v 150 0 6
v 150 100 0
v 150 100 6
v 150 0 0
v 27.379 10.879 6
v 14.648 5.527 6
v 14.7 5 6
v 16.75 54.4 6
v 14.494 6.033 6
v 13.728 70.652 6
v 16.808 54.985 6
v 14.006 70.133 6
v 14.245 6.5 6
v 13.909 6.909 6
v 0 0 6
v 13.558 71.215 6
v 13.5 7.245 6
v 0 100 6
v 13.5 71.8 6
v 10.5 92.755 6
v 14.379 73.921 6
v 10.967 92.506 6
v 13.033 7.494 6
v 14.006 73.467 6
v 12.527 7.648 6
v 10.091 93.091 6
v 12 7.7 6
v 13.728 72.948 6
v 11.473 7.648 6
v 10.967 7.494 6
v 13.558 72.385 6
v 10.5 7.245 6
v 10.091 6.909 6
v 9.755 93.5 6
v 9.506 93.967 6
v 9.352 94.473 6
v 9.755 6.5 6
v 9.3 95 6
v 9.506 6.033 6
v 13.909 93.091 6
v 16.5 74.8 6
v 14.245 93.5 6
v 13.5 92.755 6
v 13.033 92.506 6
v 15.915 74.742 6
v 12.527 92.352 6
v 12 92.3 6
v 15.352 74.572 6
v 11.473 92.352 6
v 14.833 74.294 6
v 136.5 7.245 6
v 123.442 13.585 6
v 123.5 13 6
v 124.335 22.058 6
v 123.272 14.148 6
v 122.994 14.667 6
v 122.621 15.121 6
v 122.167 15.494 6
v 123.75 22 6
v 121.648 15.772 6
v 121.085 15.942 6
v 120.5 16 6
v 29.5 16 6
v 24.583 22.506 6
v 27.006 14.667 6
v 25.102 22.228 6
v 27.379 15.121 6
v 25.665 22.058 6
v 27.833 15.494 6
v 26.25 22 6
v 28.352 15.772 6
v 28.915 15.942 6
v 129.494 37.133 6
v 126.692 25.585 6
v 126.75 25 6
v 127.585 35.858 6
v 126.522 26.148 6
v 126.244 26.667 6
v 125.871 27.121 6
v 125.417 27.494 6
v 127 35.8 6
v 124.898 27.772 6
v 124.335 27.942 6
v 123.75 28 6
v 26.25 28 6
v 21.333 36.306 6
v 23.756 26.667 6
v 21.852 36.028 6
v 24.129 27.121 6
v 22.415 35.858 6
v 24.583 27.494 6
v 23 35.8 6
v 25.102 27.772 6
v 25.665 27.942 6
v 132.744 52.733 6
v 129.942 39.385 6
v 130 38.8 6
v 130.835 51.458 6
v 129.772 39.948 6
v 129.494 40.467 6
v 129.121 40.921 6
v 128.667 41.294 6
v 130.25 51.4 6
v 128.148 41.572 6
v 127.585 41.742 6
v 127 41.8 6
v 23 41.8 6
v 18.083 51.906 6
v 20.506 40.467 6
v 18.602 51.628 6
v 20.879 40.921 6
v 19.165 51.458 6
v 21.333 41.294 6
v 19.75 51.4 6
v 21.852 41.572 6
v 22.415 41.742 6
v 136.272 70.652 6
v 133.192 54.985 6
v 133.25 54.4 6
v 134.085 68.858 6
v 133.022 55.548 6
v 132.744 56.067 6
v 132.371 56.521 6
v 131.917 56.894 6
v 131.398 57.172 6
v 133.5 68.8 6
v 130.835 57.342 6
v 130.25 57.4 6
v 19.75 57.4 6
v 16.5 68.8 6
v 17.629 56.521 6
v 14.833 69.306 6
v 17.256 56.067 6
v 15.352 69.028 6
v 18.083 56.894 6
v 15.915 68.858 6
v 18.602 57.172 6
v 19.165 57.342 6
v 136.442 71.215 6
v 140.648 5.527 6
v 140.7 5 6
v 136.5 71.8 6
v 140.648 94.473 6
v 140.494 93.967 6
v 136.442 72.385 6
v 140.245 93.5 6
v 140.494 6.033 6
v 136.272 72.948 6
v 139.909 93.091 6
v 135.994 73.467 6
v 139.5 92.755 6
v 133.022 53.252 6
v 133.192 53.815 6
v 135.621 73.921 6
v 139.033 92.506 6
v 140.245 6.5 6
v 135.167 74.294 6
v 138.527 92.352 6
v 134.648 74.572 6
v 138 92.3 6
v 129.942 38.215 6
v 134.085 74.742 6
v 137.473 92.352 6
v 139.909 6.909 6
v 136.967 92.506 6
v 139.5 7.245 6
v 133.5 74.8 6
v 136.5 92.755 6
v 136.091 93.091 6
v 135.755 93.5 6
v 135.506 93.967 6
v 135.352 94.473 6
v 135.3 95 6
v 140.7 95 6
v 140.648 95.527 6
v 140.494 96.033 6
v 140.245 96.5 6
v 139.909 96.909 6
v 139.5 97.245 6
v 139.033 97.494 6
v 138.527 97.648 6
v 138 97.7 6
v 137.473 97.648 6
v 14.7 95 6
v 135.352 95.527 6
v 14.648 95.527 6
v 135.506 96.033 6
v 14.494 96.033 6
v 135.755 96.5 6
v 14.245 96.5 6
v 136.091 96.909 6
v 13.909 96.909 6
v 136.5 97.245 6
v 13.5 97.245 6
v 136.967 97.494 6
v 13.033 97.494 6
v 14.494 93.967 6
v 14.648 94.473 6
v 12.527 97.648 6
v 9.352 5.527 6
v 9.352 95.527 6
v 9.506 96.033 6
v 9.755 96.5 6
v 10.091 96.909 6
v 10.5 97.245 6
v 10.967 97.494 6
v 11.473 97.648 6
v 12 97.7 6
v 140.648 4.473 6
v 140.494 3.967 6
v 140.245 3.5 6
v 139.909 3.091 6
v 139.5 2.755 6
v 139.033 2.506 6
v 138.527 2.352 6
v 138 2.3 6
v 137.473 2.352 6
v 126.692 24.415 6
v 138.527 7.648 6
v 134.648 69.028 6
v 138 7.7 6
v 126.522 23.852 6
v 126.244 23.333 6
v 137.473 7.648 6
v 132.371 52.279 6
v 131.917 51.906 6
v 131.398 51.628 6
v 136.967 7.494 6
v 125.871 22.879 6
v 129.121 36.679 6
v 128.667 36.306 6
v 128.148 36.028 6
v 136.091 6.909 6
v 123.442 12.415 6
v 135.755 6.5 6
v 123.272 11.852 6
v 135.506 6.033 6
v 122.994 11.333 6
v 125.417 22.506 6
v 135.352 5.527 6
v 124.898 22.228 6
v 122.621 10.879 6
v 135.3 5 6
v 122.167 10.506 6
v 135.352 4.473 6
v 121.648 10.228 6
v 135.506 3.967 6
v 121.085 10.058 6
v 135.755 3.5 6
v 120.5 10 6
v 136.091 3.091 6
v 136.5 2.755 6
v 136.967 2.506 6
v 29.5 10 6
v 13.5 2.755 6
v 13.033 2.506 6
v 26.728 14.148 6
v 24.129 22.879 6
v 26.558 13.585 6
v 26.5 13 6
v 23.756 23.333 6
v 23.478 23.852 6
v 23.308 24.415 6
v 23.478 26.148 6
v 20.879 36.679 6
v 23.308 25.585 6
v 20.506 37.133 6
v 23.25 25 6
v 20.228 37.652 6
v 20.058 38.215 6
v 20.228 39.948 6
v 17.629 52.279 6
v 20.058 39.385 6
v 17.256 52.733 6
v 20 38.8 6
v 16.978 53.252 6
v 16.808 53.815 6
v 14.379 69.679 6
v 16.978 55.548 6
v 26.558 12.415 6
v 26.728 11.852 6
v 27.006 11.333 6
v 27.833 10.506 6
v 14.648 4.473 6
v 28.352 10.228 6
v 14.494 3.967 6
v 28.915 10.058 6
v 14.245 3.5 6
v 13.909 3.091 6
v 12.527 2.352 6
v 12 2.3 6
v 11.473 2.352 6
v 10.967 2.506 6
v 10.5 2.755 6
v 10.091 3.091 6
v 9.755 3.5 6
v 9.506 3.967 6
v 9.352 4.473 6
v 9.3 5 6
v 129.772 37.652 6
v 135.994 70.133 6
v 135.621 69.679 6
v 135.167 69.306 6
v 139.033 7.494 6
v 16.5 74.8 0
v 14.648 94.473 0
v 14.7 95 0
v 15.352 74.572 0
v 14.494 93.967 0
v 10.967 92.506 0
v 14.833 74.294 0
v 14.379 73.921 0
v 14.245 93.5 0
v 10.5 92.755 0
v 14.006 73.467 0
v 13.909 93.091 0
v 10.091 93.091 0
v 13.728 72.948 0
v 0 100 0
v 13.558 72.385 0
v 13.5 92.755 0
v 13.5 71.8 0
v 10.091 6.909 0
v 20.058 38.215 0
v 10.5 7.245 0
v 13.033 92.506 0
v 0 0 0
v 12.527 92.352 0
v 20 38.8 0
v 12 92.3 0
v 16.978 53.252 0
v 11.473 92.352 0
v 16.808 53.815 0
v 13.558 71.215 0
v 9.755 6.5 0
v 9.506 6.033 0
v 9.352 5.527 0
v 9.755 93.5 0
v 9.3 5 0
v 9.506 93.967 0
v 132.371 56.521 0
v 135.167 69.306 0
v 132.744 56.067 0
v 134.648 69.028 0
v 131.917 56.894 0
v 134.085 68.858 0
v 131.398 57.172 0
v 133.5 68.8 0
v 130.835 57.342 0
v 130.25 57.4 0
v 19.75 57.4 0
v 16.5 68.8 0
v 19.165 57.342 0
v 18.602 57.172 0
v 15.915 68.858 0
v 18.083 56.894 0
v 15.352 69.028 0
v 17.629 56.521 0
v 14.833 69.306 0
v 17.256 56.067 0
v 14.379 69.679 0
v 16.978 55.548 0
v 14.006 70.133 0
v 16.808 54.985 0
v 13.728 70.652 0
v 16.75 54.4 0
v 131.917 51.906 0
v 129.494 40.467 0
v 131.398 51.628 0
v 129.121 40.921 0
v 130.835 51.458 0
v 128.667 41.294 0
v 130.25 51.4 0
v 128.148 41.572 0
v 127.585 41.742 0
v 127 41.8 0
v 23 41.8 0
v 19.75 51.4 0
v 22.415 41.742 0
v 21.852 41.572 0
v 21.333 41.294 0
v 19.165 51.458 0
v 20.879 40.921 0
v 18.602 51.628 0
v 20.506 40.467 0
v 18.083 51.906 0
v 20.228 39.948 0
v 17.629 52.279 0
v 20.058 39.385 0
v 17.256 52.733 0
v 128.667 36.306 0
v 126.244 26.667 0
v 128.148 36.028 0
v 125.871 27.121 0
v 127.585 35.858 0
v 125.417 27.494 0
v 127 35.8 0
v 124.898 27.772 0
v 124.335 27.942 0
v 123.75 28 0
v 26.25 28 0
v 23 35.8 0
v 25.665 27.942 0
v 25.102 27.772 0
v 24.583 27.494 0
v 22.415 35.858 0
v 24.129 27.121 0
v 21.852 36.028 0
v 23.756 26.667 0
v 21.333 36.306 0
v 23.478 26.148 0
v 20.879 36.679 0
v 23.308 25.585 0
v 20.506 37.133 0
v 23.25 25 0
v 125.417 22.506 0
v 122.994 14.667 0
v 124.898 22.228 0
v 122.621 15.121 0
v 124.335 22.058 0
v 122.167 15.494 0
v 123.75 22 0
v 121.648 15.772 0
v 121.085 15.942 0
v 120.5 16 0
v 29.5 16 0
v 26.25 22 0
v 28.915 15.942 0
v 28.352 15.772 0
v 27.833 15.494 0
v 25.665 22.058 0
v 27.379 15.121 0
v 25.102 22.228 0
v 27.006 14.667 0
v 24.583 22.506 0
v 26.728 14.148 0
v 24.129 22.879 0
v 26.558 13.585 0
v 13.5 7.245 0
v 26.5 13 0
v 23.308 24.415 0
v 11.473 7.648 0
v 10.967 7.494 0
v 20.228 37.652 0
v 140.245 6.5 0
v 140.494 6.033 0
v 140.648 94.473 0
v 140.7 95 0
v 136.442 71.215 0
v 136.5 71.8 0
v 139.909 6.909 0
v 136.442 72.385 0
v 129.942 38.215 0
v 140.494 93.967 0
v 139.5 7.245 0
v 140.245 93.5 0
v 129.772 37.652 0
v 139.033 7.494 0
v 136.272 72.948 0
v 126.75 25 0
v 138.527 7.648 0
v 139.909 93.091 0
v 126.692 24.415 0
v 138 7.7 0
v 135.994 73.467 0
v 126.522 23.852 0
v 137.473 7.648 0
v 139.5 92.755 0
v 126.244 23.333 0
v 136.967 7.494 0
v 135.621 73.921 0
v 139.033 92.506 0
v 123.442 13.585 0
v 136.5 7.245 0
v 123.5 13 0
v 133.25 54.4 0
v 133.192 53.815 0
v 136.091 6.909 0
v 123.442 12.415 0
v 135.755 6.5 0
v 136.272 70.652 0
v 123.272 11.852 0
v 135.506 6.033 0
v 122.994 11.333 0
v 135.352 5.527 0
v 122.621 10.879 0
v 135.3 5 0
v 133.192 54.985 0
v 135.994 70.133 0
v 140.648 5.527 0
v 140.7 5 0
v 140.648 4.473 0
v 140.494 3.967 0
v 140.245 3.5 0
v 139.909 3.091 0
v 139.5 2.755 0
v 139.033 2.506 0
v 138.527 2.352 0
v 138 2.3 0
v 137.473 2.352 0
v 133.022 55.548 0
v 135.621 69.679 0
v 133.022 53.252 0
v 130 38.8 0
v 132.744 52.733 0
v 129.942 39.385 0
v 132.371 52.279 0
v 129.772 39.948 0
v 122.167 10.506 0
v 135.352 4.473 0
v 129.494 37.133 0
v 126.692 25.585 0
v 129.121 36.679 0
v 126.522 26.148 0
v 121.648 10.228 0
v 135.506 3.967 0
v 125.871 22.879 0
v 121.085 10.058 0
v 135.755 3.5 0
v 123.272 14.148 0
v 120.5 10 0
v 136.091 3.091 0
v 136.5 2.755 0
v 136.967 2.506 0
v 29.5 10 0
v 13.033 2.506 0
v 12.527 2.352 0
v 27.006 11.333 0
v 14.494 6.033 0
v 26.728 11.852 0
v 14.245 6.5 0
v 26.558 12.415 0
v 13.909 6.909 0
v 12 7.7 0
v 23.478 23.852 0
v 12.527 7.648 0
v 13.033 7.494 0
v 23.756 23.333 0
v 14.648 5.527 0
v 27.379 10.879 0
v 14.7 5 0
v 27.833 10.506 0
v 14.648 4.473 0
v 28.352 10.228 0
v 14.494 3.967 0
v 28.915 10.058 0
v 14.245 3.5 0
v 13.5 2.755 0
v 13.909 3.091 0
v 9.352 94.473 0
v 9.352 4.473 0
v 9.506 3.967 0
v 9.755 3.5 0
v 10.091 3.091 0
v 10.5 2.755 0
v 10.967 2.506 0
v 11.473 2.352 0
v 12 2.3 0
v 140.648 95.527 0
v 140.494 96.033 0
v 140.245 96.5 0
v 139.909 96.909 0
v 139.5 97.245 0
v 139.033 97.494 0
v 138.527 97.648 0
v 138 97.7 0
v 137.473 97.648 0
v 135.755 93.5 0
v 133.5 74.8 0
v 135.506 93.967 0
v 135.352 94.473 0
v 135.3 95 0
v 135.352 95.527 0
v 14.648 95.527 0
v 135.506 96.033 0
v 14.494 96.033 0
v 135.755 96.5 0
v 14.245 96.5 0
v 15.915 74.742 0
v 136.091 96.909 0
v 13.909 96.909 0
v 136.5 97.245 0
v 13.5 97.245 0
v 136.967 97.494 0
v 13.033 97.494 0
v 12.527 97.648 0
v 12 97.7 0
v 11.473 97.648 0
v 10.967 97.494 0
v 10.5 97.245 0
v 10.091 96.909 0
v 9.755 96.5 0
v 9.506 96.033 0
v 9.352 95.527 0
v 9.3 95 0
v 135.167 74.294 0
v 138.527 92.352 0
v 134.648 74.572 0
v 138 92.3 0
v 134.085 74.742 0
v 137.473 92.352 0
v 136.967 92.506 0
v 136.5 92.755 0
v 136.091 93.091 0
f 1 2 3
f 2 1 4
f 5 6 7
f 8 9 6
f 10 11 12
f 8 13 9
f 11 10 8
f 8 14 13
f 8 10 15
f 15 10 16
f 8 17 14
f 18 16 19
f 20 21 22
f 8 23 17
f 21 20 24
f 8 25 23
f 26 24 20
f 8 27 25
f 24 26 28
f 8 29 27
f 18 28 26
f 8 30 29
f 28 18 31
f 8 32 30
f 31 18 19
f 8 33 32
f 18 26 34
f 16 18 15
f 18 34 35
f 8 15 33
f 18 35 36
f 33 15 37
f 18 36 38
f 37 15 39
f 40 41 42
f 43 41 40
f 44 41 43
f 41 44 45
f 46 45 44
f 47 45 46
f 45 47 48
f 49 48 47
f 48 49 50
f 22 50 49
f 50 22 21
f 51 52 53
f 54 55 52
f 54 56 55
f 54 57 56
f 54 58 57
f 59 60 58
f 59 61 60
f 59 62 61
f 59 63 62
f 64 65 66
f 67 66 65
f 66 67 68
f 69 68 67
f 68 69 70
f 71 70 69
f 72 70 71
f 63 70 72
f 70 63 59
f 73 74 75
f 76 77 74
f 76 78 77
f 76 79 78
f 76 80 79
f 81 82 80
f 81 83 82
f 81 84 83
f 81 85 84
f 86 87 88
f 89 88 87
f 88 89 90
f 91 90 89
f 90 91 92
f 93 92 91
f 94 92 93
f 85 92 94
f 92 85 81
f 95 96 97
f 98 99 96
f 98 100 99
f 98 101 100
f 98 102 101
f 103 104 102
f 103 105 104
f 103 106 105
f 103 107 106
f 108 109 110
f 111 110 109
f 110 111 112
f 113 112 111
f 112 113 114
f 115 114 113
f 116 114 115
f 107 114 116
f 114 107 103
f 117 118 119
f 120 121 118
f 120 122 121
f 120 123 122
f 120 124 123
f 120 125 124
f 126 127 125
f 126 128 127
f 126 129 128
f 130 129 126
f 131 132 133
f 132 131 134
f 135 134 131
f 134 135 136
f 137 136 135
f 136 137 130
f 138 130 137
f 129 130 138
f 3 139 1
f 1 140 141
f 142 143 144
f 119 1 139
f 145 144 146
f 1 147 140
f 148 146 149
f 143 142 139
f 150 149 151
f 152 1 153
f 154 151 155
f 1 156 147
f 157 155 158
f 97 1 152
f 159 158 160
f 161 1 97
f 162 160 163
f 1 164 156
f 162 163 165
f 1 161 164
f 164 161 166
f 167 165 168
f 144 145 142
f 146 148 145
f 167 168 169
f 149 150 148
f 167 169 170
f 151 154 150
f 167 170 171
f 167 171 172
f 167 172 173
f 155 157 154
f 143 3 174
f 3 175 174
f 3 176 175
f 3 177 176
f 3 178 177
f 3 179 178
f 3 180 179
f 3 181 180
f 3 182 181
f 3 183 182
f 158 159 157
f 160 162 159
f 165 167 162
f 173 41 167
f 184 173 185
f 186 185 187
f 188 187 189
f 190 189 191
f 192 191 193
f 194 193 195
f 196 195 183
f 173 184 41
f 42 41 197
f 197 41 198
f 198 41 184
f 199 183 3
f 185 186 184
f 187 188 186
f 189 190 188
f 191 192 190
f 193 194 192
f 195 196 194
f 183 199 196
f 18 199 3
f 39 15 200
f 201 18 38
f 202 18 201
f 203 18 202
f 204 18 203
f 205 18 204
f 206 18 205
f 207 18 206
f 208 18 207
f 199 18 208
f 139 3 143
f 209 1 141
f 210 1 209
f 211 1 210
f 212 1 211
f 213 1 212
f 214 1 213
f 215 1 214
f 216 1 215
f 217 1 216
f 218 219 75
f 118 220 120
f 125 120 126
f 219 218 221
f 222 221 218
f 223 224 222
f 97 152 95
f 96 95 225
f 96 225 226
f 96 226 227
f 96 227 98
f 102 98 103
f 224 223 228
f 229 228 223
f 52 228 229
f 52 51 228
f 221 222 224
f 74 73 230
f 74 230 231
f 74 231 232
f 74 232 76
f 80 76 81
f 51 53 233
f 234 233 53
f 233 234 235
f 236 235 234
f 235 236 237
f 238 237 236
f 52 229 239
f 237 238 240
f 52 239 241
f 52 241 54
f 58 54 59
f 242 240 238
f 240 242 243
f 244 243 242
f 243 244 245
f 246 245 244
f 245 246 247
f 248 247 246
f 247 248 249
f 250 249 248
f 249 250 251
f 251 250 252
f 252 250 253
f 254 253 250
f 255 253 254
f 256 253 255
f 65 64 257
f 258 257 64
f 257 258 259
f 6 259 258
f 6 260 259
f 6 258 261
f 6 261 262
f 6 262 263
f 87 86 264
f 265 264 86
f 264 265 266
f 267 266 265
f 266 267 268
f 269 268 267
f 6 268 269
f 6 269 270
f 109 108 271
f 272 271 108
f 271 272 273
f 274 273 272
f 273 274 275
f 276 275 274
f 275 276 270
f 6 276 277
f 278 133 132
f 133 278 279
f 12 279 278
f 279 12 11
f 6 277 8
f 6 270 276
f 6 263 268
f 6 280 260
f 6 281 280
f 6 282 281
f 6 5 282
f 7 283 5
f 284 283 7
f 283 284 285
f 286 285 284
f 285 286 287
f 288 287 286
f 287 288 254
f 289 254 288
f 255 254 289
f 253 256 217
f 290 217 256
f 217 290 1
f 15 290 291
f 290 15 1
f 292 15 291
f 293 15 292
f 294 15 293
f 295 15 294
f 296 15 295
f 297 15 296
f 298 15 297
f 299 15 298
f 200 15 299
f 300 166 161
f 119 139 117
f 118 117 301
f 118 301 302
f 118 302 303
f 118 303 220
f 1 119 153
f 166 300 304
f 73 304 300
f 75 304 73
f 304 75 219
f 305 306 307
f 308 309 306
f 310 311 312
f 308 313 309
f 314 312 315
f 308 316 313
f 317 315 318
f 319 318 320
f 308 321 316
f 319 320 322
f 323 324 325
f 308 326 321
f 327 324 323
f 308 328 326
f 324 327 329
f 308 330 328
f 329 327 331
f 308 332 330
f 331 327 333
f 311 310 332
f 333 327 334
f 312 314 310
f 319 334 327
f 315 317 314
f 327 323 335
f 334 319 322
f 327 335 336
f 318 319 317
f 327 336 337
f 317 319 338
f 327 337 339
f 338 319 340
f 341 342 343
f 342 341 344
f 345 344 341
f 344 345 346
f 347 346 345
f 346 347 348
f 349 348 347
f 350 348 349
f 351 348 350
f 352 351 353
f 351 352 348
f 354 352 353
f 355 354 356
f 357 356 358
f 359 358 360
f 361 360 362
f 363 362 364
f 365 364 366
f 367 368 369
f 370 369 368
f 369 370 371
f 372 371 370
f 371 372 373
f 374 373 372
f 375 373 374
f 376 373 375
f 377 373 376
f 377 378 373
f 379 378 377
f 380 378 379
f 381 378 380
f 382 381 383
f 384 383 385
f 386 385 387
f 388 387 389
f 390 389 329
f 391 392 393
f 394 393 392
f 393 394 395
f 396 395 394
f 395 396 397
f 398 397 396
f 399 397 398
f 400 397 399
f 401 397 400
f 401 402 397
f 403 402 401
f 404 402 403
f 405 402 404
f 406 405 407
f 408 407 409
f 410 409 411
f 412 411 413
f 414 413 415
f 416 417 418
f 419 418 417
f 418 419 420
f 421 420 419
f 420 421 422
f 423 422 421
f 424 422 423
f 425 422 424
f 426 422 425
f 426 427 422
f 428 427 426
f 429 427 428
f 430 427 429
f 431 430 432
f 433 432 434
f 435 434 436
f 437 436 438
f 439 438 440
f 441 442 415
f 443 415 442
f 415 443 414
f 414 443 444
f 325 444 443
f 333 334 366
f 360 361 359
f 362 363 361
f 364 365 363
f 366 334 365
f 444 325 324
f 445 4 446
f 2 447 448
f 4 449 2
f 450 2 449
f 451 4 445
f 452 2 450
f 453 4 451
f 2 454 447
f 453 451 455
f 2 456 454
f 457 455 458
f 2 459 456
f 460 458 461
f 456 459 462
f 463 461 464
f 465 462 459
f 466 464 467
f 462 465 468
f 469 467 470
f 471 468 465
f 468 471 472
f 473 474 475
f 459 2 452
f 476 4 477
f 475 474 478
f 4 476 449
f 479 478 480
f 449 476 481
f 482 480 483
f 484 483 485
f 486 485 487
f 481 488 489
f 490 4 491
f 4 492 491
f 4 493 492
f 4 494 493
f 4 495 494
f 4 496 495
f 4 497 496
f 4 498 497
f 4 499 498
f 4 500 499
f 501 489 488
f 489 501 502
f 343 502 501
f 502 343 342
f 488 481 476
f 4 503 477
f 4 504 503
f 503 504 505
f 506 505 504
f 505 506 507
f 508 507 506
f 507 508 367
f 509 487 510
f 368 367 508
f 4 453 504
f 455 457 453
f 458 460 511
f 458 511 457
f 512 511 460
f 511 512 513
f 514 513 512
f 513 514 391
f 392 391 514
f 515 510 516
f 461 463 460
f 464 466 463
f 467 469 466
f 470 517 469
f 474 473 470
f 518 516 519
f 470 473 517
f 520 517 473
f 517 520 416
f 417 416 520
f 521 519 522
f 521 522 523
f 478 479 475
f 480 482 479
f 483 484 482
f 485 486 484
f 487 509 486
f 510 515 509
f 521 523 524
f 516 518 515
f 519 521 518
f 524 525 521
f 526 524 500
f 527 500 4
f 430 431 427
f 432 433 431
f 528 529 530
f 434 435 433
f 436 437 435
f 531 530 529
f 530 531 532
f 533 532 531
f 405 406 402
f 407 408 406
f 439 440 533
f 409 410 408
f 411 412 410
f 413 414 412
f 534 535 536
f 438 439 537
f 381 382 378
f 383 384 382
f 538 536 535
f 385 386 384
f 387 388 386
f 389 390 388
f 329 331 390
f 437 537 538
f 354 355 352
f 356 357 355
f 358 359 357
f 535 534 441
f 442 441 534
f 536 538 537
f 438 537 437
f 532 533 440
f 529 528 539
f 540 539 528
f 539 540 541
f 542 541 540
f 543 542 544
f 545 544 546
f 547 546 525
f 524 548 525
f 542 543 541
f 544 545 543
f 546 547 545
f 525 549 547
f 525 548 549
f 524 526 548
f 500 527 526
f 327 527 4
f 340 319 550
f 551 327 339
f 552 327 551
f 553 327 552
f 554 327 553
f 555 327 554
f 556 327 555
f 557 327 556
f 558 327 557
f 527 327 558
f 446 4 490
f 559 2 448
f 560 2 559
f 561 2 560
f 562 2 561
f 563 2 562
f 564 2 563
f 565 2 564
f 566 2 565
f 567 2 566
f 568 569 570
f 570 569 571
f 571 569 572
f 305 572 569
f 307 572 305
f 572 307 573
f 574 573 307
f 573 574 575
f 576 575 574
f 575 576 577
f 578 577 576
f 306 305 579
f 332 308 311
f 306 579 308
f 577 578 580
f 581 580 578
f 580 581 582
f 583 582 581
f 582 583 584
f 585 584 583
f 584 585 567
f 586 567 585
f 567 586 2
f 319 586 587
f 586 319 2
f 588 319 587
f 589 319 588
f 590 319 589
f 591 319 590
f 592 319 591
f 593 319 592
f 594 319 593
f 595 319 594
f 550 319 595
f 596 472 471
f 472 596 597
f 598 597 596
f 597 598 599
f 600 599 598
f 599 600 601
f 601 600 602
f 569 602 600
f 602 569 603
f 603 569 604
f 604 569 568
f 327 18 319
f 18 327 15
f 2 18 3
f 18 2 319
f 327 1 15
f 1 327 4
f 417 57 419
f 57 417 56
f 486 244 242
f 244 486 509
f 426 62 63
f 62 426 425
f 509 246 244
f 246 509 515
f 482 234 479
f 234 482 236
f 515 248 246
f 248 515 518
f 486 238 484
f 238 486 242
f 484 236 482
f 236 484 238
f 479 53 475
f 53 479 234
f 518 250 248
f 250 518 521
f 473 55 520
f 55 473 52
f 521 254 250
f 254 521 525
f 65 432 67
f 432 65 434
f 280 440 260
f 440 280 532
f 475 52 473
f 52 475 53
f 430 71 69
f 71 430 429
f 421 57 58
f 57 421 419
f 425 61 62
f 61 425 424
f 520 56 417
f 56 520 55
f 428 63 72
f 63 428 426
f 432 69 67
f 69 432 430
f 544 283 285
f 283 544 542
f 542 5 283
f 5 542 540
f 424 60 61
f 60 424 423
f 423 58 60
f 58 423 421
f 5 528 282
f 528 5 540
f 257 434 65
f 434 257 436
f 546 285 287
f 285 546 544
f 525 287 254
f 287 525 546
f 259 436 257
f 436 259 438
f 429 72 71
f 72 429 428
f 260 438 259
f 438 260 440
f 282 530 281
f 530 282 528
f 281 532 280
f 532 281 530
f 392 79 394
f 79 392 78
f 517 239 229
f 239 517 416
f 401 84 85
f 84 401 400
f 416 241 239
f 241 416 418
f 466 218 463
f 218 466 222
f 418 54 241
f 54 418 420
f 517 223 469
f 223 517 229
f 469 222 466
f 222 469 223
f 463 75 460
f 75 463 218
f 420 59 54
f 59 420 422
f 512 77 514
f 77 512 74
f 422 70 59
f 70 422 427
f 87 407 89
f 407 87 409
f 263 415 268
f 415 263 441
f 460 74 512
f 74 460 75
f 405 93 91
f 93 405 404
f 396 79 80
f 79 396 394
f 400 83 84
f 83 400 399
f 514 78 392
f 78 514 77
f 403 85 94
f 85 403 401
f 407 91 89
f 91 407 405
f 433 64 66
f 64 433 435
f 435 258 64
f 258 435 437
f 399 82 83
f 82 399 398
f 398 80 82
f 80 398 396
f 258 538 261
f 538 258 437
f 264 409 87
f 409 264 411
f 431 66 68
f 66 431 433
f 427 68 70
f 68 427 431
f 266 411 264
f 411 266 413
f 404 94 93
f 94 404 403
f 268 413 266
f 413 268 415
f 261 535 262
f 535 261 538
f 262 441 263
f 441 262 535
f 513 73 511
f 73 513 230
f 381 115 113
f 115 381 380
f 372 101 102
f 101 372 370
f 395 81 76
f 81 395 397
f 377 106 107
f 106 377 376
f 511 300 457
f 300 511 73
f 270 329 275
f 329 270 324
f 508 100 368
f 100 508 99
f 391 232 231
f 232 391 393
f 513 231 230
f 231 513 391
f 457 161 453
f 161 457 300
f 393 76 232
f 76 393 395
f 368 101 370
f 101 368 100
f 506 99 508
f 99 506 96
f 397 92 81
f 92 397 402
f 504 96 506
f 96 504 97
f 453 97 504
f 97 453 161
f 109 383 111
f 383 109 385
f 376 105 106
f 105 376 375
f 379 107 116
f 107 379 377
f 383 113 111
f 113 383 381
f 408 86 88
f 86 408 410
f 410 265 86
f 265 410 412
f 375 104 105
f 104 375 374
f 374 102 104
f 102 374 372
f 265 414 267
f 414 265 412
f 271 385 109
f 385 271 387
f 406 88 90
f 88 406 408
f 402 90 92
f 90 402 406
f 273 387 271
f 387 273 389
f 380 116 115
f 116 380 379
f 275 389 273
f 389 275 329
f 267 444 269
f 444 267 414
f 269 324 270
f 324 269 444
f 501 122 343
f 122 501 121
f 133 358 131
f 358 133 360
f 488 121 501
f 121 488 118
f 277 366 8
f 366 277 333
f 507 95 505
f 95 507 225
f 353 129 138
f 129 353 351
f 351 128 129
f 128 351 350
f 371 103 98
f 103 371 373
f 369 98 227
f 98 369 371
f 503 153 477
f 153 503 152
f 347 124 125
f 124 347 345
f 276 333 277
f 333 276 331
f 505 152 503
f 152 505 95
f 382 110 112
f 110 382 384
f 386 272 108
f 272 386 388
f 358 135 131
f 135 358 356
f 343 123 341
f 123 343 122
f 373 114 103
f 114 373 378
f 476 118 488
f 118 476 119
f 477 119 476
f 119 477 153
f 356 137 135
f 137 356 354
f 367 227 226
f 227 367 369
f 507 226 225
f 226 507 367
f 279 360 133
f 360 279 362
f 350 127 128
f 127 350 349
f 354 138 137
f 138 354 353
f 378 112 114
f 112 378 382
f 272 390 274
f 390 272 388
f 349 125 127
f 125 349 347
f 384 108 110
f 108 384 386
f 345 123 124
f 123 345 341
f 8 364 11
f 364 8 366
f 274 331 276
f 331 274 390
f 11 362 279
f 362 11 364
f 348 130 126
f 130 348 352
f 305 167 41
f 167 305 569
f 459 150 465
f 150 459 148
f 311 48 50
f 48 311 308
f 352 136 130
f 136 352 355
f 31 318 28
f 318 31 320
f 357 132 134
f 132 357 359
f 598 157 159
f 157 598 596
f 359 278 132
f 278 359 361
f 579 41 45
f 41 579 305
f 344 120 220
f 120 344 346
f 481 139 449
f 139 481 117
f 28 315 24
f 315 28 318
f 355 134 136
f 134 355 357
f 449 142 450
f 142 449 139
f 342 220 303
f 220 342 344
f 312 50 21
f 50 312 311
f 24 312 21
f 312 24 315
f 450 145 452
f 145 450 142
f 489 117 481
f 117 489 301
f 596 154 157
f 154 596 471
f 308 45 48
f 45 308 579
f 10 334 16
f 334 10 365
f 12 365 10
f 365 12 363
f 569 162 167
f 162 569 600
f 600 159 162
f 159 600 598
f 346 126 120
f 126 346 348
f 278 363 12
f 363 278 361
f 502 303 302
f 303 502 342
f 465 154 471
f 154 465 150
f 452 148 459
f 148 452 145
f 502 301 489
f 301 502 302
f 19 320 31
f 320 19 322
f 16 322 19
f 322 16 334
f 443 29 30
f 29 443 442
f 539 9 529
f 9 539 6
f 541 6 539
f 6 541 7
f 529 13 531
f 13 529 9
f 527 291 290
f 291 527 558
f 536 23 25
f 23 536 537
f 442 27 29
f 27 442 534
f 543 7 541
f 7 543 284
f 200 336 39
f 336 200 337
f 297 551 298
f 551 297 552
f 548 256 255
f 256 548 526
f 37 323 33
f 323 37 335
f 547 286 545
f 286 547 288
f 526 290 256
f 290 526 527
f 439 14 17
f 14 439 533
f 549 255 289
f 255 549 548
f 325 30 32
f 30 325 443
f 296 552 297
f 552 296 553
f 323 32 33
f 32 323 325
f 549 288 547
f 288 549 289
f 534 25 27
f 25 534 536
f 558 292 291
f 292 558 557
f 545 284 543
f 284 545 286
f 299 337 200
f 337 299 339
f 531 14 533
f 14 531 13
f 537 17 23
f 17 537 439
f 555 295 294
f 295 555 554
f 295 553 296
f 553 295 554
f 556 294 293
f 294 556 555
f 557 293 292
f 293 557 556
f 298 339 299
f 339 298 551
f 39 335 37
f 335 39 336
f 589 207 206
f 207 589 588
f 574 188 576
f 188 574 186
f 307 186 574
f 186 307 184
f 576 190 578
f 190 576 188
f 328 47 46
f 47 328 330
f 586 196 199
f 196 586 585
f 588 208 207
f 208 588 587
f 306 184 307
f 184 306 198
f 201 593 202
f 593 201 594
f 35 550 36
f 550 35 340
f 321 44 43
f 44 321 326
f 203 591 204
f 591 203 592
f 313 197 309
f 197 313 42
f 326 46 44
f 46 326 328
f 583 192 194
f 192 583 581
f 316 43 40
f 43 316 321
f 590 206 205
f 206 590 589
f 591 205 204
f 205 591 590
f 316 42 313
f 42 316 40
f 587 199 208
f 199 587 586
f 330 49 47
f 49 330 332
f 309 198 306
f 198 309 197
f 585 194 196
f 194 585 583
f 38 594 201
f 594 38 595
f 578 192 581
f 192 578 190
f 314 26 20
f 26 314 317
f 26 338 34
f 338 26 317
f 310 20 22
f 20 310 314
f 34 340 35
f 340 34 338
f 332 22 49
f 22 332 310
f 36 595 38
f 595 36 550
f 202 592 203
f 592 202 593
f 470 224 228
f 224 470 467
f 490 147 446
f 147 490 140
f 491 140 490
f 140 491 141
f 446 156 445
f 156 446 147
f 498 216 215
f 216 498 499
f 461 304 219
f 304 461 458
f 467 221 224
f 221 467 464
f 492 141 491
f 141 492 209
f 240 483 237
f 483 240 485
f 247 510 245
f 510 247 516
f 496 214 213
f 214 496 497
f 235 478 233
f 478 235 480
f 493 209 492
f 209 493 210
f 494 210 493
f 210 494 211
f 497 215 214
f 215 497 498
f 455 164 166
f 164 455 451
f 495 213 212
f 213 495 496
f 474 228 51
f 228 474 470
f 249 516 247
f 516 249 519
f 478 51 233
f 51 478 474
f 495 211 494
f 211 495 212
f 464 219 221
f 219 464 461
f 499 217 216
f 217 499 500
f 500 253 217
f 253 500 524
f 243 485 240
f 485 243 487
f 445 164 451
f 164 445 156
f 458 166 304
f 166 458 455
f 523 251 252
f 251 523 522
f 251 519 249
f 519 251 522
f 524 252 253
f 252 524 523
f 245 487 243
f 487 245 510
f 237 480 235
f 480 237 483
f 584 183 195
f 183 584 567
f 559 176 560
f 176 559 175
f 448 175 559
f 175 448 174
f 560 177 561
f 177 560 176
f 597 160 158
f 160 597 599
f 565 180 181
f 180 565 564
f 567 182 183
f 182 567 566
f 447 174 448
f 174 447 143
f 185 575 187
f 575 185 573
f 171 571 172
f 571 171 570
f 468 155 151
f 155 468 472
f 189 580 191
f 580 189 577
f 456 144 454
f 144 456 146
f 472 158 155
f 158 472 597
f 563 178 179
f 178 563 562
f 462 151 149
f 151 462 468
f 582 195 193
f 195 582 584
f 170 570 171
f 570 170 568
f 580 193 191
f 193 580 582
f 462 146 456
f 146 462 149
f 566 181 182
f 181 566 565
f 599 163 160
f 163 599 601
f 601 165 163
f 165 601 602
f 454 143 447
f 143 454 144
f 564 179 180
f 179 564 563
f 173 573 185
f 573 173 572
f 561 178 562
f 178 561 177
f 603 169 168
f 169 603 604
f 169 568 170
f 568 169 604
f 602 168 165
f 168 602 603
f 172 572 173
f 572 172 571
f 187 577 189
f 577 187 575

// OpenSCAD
$fn = 32;

// ----------------------------------------------------------------------
// Slotted panel: 150 x 100 mm, 5 рядов of slots
// ----------------------------------------------------------------------

// --- parameters (mm) ---
panel_w = 150;            // panel width
panel_d = 100;            // panel depth
thick = 6;                // panel thickness
slot_w = 6;               // slot width
pitch0 = 12;              // first row pitch
pitch_step = 1.8;         // pitch increase per row
margin = 10;              // margin around the slot field
rows = 5;                 // number of slot rows
mount_d = 5.4;            // mounting holes
mount_x = 63;             // mounting hole offset

difference() {
  union() {
    cube([panel_w, panel_d, thick]);
  }
  /* slot rows: stadium shaped cutters, 2.5 mm clear of both faces */
  /* row 0: pitch 12, length 91 */
  hull() {
    translate([29.5, 13, -2.5]) cylinder(h = thick + 5, d = slot_w);
    translate([120.5, 13, -2.5]) cylinder(h = thick + 5, d = slot_w);
  }
  /* row 1: pitch 13.8, length 97.5 */
  hull() {
    translate([26.25, 25, -2.5]) cylinder(h = thick + 5, d = slot_w);
    translate([123.75, 25, -2.5]) cylinder(h = thick + 5, d = slot_w);
  }
  /* row 2: pitch 15.6, length 104 */
  hull() {
    translate([23, 38.8, -2.5]) cylinder(h = thick + 5, d = slot_w);
    translate([127, 38.8, -2.5]) cylinder(h = thick + 5, d = slot_w);
  }
  /* row 3: pitch 17.4, length 110.5 */
  hull() {
    translate([19.75, 54.4, -2.5]) cylinder(h = thick + 5, d = slot_w);
    translate([130.25, 54.4, -2.5]) cylinder(h = thick + 5, d = slot_w);
  }
  /* row 4: pitch 19.2, length 117 */
  hull() {
    translate([16.5, 71.8, -2.5]) cylinder(h = thick + 5, d = slot_w);
    translate([133.5, 71.8, -2.5]) cylinder(h = thick + 5, d = slot_w);
  }
  translate([12, 5, -2.5]) cylinder(h = 11, d = mount_d);
  translate([12, 95, -2.5]) cylinder(h = 11, d = mount_d);
  translate([138, 5, -2.5]) cylinder(h = 11, d = mount_d);
  translate([138, 95, -2.5]) cylinder(h = 11, d = mount_d);
}
